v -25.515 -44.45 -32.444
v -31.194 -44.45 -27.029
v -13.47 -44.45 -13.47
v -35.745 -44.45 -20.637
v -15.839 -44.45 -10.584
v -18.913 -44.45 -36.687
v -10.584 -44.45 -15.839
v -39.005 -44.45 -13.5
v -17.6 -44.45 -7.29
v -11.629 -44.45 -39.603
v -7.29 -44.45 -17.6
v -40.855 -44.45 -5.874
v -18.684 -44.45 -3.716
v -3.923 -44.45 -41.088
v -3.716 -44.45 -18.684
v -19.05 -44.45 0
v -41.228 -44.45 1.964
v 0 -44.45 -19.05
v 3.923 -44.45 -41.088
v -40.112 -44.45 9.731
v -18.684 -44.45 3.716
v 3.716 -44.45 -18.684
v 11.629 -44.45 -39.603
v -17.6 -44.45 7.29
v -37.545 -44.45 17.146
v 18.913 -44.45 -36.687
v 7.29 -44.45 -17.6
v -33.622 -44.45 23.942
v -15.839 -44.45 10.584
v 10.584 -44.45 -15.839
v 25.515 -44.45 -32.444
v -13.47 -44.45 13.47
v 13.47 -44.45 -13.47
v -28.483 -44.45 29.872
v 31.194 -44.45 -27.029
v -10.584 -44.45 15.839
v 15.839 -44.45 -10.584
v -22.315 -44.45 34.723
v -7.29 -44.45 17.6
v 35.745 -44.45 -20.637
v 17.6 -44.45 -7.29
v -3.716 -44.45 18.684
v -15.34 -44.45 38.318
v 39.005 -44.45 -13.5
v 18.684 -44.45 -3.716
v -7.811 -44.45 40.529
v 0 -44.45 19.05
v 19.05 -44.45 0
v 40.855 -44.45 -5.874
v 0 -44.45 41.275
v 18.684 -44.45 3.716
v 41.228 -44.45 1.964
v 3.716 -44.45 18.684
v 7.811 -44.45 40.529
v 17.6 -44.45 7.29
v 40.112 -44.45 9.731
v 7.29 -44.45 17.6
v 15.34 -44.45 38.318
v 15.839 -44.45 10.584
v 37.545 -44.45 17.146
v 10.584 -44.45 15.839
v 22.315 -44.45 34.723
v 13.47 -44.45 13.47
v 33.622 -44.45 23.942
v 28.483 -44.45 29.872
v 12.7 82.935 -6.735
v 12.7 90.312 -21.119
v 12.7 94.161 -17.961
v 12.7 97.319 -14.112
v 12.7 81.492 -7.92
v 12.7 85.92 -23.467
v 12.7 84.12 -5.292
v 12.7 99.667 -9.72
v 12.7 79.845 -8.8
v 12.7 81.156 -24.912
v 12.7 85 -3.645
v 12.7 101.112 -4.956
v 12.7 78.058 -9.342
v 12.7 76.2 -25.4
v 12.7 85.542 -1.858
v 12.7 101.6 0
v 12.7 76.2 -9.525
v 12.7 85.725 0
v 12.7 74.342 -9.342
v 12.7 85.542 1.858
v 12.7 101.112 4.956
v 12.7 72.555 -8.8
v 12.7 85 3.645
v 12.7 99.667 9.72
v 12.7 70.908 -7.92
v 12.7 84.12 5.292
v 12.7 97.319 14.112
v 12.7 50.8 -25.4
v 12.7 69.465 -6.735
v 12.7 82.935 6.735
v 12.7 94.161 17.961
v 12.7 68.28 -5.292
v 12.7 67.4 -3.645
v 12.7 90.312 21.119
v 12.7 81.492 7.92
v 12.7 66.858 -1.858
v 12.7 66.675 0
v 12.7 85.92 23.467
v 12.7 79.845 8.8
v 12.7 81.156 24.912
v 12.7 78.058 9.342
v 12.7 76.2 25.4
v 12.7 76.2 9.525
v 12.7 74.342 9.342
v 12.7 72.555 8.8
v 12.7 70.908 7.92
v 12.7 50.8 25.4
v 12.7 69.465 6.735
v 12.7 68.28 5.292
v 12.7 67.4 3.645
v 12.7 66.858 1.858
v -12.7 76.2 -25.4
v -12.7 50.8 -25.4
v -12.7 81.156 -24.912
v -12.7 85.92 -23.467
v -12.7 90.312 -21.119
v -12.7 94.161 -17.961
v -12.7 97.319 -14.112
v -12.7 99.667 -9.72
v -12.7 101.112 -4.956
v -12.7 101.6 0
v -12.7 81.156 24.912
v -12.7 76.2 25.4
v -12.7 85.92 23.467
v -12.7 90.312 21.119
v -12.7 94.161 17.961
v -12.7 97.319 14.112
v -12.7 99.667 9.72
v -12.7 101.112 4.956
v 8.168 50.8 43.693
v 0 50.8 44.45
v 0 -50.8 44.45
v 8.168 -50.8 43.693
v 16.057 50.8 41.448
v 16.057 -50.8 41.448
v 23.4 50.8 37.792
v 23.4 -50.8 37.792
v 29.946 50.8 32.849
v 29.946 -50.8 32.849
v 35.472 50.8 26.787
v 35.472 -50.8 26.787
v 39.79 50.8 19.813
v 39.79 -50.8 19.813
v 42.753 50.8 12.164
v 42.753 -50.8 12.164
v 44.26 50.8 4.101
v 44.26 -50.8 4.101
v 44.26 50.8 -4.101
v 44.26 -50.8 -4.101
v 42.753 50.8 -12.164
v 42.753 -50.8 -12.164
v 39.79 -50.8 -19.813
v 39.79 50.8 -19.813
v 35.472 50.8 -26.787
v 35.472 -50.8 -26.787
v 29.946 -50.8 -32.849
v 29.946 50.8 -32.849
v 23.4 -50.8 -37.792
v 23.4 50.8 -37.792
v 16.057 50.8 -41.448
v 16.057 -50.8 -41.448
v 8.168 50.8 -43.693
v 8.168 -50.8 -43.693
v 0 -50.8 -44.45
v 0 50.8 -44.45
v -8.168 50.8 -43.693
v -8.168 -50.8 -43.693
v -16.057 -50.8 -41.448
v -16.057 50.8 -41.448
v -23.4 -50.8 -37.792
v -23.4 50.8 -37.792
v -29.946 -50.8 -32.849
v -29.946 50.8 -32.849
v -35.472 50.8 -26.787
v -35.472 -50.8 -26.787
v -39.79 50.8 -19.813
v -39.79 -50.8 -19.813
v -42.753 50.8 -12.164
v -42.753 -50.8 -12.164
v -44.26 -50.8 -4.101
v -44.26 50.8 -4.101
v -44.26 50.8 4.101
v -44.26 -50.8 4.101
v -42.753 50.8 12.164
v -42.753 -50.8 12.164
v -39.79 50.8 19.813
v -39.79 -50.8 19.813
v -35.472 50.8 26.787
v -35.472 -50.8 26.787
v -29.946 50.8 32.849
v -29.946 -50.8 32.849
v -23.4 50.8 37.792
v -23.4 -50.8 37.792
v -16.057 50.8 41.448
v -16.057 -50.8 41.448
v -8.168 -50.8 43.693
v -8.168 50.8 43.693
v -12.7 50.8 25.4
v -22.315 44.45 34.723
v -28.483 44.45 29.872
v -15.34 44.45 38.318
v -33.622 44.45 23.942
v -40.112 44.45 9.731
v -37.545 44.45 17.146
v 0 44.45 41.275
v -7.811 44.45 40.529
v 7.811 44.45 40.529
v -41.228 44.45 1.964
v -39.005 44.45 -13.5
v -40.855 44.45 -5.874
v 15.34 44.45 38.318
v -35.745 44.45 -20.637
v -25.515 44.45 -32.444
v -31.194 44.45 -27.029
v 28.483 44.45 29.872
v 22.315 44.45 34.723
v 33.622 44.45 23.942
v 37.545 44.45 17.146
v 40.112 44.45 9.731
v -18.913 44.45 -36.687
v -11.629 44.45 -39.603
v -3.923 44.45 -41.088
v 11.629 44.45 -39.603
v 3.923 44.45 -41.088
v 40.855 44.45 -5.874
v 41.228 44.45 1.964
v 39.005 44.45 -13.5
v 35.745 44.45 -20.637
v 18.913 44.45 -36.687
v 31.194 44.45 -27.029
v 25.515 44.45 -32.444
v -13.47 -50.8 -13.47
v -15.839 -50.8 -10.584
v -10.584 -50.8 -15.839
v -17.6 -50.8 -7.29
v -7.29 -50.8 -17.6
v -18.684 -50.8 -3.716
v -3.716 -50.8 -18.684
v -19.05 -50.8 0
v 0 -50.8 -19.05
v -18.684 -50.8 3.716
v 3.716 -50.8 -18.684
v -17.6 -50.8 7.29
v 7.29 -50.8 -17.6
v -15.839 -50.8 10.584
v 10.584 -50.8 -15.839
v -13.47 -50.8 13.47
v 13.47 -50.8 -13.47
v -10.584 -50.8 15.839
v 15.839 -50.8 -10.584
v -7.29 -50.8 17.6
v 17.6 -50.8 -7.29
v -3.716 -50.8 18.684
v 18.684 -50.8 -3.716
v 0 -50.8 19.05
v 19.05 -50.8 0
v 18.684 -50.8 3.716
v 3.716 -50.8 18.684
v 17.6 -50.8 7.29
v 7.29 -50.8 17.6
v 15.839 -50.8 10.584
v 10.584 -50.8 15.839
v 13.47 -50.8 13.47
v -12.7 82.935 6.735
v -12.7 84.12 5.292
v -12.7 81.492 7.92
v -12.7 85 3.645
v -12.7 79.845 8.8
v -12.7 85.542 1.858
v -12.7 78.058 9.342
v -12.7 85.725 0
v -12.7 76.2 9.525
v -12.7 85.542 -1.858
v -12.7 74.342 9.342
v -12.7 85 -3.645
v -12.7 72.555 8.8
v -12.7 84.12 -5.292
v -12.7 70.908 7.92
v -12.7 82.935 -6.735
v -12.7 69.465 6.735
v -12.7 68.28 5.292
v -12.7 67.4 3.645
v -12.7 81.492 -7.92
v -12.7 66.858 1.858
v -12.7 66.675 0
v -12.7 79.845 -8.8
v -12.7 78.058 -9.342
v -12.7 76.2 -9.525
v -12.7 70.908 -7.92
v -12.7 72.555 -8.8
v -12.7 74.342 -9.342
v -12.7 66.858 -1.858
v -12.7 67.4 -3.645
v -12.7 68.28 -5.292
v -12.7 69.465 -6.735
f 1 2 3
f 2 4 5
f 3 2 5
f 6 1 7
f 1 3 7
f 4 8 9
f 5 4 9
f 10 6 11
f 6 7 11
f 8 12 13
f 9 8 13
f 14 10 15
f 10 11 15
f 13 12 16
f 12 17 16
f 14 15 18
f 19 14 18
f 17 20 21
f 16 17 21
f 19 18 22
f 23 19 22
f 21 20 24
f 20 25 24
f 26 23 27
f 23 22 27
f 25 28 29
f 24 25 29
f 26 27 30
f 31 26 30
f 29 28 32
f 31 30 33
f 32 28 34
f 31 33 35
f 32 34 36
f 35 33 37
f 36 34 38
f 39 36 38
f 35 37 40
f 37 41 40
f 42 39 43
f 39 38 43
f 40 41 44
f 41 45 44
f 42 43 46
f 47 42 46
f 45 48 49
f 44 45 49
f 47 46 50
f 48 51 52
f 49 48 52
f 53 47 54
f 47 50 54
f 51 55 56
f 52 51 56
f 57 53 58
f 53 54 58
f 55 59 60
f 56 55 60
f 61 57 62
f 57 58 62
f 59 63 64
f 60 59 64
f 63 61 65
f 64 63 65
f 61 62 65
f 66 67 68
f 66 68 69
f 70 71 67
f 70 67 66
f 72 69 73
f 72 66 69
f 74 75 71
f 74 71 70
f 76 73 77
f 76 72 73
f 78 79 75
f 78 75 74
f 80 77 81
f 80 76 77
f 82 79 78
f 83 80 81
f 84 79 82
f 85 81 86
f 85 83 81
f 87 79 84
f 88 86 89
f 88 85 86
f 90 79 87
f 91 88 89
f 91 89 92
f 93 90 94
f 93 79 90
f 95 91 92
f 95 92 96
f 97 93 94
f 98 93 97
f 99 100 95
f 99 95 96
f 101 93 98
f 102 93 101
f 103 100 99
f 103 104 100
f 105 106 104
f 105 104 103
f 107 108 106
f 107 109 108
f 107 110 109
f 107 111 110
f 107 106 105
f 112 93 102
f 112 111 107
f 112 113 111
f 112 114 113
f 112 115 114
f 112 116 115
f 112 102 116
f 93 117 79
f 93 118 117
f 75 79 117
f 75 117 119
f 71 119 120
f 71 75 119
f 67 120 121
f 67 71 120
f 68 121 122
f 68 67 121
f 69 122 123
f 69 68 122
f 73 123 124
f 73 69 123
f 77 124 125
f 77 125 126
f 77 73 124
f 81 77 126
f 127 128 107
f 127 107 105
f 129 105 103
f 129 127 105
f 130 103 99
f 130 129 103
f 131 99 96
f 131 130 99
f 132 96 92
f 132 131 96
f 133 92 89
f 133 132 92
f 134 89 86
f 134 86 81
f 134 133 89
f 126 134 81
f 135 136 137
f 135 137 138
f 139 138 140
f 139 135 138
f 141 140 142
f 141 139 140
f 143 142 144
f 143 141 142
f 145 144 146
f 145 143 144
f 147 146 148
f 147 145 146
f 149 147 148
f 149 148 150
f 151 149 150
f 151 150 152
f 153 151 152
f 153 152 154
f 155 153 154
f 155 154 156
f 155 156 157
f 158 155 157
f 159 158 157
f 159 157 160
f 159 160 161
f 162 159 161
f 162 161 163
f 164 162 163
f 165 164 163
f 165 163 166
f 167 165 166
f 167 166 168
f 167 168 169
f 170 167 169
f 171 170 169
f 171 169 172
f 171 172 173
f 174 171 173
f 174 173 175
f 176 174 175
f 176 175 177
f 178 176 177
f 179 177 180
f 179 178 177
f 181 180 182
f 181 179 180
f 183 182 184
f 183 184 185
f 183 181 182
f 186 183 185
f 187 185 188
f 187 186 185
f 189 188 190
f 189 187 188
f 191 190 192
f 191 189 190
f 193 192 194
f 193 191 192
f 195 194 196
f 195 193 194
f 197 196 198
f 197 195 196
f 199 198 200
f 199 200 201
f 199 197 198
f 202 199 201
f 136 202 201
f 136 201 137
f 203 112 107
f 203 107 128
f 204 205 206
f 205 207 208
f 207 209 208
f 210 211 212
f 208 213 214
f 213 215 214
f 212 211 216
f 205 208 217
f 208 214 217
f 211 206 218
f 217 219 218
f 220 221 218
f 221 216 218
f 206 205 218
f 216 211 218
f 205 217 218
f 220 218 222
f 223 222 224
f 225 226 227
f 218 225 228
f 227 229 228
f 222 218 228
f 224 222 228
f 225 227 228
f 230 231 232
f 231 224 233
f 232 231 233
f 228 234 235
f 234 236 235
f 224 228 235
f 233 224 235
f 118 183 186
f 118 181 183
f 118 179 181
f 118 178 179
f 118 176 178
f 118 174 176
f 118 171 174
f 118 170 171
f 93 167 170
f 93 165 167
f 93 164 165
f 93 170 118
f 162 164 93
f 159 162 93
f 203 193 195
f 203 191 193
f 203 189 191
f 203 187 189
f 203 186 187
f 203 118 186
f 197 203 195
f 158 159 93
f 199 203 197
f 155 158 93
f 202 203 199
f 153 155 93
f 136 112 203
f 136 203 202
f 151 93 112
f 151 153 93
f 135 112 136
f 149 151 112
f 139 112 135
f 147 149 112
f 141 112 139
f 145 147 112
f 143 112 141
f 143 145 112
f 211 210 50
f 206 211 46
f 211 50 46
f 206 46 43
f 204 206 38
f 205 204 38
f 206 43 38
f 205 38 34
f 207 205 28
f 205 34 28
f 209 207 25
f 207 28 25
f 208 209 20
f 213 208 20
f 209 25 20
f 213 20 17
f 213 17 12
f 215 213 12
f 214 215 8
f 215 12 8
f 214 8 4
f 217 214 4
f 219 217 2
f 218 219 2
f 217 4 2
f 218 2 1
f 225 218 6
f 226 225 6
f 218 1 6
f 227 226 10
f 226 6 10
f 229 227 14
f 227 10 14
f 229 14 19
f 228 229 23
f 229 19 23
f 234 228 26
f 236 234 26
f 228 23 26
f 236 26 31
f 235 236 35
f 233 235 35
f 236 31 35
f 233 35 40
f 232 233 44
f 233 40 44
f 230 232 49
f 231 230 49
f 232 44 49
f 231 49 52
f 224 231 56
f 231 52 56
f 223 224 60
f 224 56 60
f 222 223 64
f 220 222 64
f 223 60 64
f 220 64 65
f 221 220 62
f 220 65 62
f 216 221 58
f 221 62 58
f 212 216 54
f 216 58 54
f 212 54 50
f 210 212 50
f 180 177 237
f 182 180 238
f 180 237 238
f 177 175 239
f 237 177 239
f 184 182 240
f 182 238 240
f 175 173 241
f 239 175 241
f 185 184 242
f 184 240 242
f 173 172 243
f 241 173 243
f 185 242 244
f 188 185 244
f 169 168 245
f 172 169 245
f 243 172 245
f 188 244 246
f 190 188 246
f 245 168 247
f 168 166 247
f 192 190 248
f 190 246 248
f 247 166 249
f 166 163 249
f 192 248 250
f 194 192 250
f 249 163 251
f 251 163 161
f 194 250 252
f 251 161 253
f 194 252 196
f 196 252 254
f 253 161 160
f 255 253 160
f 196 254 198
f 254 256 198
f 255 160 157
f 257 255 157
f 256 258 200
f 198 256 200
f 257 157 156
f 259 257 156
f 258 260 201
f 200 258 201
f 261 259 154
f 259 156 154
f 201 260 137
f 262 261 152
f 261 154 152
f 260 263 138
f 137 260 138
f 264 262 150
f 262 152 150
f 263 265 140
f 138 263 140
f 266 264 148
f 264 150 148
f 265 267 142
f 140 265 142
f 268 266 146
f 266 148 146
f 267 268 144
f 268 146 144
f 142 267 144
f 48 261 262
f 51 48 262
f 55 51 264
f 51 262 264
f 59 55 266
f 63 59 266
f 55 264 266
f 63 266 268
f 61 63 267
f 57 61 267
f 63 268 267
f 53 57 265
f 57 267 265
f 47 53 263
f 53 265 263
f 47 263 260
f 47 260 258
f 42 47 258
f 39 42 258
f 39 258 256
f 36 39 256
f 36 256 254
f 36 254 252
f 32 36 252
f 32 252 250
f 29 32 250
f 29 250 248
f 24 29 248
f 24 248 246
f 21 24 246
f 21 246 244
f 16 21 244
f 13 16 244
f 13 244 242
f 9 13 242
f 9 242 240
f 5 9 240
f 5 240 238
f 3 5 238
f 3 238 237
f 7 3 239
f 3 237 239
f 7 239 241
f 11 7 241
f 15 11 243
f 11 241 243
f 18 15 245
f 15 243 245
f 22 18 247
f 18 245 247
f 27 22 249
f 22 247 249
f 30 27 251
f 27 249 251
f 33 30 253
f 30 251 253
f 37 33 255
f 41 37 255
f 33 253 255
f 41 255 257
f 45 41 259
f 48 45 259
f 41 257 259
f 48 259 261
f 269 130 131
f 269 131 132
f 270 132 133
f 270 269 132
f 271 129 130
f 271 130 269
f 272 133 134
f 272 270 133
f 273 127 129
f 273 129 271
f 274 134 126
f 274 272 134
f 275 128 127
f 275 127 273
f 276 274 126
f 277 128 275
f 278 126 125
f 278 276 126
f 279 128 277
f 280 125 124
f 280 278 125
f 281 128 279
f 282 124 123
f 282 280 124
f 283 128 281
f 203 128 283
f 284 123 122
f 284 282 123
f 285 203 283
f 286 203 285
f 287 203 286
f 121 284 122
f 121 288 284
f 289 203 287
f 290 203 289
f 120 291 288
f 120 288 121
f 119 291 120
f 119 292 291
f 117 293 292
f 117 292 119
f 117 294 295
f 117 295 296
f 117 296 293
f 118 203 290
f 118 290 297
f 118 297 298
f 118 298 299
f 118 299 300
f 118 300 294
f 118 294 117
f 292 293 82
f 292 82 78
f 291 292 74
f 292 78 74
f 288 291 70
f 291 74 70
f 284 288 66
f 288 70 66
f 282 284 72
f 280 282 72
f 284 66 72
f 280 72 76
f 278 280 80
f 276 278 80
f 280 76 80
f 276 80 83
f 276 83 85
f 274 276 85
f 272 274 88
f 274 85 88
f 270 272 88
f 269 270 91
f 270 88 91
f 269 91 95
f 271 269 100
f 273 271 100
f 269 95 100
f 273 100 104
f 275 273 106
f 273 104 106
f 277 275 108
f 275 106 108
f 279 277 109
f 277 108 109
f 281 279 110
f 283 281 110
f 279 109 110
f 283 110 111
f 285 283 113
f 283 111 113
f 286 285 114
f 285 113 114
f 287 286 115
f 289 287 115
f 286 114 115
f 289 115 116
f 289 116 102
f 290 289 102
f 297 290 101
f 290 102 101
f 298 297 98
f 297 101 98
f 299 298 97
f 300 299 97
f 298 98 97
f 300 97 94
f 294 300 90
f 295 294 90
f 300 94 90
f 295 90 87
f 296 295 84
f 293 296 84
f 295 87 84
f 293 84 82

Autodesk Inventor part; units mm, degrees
ref_plane "YZ Plane" through (0, 0, 0) normal (1, 0, 0) x (0, 1, 0)
ref_plane "XZ Plane" through (0, 0, 0) normal (0, 1, 0) x (-1, 0, 0)
ref_plane "XY Plane" through (0, 0, 0) normal (0, 0, 1) x (1, 0, 0)
sketch "Sketch1" plane through (0, 0, 0) normal (1, 0, 0) x (0, 1, 0)
  line L0 (-50.8, 44.45) -> (50.8, 44.45)
  line L1 (50.8, 44.45) -> (50.8, 41.275)
  line L2 (-50.8, 41.275) -> (-50.8, 44.45)
  line L3 (-50.8, 44.45) -> (-47.1714, 41.275) construction
  line L4 (50.8, 41.275) -> (-50.8, 41.275)
  line L5 (50.8, 44.45) -> (47.1714, 41.275) construction
  line L6 (-71.12, 0) -> (71.12, 0) projected
  point P0 (0, 0)
revolve "Revolution1" add sketch "Sketch1" angle 360 about axis through (0, -10, 0) along (0, 1, 0)
sketch "Sketch2" plane through (0, 50.8, 0) normal (0, 1, 0) x (1, 0, 0)
  circle A0 centre (0, 0) radius 44.45
extrude "Extrusion1" add sketch "Sketch2" against normal blind 6.35
sketch "Sketch3" plane through (0, -50.8, 0) normal (0, -1, 0) x (1, 0, 0)
  circle A0 centre (0, 0) radius 44.45
extrude "Extrusion2" add sketch "Sketch3" against normal blind 6.35
sketch "Sketch4" plane through (0, -50.8, 0) normal (0, -1, 0) x (1, 0, 0)
  circle A0 centre (0, 0) radius 44.45 projected
  circle A1 centre (0, 0) radius 19.05
extrude "Extrusion3" cut sketch "Sketch4" against normal blind 12.7 contours A1
sketch "Sketch5" plane through (0, 50.8, 0) normal (0, 1, 0) x (1, 0, 0)
  line L0 (-25.4, 25.4) -> (25.4, 25.4)
  line L1 (25.4, 25.4) -> (25.4, -25.4)
  line L2 (25.4, -25.4) -> (-25.4, -25.4)
  line L3 (-25.4, -25.4) -> (-25.4, 25.4)
  line L4 (-25.4, 25.4) -> (25.4, -25.4) construction
  line L5 (25.4, 25.4) -> (-25.4, -25.4) construction
  line L6 (-12.7, 25.4) -> (12.7, 25.4)
  line L7 (12.7, 25.4) -> (12.7, -25.4)
  line L8 (12.7, -25.4) -> (-12.7, -25.4)
  line L9 (-12.7, -25.4) -> (-12.7, 25.4)
  line L10 (-12.7, 25.4) -> (12.7, -25.4) construction
  line L11 (12.7, 25.4) -> (-12.7, -25.4) construction
  point P0 (0, 0)
  dimension "d9" = 50.8
  dimension "d10" = 50.8
extrude "Extrusion6" add sketch "Sketch5" along normal blind 50.8 contours L0 L7 L2 L9
fillet "Fillet2" radius 25.4 2 edges at (0, 101.6, 25.4) (0, 101.6, -25.4)
sketch "Sketch7" plane through (12.7, 50.8, 25.4) normal (1, 0, 0) x (0, 0, -1)
  arc A0 (50.8, 25.4) -> (0, 25.4) centre (25.4, 25.4) ccw projected
  circle A1 centre (25.4, 25.4) radius 9.525
  point P0 (25.4, -50.8)
  dimension "d20" = 19.05
extrude "Extrusion7" cut sketch "Sketch7" against normal blind 50.8
properties part number "shock absorber top"
